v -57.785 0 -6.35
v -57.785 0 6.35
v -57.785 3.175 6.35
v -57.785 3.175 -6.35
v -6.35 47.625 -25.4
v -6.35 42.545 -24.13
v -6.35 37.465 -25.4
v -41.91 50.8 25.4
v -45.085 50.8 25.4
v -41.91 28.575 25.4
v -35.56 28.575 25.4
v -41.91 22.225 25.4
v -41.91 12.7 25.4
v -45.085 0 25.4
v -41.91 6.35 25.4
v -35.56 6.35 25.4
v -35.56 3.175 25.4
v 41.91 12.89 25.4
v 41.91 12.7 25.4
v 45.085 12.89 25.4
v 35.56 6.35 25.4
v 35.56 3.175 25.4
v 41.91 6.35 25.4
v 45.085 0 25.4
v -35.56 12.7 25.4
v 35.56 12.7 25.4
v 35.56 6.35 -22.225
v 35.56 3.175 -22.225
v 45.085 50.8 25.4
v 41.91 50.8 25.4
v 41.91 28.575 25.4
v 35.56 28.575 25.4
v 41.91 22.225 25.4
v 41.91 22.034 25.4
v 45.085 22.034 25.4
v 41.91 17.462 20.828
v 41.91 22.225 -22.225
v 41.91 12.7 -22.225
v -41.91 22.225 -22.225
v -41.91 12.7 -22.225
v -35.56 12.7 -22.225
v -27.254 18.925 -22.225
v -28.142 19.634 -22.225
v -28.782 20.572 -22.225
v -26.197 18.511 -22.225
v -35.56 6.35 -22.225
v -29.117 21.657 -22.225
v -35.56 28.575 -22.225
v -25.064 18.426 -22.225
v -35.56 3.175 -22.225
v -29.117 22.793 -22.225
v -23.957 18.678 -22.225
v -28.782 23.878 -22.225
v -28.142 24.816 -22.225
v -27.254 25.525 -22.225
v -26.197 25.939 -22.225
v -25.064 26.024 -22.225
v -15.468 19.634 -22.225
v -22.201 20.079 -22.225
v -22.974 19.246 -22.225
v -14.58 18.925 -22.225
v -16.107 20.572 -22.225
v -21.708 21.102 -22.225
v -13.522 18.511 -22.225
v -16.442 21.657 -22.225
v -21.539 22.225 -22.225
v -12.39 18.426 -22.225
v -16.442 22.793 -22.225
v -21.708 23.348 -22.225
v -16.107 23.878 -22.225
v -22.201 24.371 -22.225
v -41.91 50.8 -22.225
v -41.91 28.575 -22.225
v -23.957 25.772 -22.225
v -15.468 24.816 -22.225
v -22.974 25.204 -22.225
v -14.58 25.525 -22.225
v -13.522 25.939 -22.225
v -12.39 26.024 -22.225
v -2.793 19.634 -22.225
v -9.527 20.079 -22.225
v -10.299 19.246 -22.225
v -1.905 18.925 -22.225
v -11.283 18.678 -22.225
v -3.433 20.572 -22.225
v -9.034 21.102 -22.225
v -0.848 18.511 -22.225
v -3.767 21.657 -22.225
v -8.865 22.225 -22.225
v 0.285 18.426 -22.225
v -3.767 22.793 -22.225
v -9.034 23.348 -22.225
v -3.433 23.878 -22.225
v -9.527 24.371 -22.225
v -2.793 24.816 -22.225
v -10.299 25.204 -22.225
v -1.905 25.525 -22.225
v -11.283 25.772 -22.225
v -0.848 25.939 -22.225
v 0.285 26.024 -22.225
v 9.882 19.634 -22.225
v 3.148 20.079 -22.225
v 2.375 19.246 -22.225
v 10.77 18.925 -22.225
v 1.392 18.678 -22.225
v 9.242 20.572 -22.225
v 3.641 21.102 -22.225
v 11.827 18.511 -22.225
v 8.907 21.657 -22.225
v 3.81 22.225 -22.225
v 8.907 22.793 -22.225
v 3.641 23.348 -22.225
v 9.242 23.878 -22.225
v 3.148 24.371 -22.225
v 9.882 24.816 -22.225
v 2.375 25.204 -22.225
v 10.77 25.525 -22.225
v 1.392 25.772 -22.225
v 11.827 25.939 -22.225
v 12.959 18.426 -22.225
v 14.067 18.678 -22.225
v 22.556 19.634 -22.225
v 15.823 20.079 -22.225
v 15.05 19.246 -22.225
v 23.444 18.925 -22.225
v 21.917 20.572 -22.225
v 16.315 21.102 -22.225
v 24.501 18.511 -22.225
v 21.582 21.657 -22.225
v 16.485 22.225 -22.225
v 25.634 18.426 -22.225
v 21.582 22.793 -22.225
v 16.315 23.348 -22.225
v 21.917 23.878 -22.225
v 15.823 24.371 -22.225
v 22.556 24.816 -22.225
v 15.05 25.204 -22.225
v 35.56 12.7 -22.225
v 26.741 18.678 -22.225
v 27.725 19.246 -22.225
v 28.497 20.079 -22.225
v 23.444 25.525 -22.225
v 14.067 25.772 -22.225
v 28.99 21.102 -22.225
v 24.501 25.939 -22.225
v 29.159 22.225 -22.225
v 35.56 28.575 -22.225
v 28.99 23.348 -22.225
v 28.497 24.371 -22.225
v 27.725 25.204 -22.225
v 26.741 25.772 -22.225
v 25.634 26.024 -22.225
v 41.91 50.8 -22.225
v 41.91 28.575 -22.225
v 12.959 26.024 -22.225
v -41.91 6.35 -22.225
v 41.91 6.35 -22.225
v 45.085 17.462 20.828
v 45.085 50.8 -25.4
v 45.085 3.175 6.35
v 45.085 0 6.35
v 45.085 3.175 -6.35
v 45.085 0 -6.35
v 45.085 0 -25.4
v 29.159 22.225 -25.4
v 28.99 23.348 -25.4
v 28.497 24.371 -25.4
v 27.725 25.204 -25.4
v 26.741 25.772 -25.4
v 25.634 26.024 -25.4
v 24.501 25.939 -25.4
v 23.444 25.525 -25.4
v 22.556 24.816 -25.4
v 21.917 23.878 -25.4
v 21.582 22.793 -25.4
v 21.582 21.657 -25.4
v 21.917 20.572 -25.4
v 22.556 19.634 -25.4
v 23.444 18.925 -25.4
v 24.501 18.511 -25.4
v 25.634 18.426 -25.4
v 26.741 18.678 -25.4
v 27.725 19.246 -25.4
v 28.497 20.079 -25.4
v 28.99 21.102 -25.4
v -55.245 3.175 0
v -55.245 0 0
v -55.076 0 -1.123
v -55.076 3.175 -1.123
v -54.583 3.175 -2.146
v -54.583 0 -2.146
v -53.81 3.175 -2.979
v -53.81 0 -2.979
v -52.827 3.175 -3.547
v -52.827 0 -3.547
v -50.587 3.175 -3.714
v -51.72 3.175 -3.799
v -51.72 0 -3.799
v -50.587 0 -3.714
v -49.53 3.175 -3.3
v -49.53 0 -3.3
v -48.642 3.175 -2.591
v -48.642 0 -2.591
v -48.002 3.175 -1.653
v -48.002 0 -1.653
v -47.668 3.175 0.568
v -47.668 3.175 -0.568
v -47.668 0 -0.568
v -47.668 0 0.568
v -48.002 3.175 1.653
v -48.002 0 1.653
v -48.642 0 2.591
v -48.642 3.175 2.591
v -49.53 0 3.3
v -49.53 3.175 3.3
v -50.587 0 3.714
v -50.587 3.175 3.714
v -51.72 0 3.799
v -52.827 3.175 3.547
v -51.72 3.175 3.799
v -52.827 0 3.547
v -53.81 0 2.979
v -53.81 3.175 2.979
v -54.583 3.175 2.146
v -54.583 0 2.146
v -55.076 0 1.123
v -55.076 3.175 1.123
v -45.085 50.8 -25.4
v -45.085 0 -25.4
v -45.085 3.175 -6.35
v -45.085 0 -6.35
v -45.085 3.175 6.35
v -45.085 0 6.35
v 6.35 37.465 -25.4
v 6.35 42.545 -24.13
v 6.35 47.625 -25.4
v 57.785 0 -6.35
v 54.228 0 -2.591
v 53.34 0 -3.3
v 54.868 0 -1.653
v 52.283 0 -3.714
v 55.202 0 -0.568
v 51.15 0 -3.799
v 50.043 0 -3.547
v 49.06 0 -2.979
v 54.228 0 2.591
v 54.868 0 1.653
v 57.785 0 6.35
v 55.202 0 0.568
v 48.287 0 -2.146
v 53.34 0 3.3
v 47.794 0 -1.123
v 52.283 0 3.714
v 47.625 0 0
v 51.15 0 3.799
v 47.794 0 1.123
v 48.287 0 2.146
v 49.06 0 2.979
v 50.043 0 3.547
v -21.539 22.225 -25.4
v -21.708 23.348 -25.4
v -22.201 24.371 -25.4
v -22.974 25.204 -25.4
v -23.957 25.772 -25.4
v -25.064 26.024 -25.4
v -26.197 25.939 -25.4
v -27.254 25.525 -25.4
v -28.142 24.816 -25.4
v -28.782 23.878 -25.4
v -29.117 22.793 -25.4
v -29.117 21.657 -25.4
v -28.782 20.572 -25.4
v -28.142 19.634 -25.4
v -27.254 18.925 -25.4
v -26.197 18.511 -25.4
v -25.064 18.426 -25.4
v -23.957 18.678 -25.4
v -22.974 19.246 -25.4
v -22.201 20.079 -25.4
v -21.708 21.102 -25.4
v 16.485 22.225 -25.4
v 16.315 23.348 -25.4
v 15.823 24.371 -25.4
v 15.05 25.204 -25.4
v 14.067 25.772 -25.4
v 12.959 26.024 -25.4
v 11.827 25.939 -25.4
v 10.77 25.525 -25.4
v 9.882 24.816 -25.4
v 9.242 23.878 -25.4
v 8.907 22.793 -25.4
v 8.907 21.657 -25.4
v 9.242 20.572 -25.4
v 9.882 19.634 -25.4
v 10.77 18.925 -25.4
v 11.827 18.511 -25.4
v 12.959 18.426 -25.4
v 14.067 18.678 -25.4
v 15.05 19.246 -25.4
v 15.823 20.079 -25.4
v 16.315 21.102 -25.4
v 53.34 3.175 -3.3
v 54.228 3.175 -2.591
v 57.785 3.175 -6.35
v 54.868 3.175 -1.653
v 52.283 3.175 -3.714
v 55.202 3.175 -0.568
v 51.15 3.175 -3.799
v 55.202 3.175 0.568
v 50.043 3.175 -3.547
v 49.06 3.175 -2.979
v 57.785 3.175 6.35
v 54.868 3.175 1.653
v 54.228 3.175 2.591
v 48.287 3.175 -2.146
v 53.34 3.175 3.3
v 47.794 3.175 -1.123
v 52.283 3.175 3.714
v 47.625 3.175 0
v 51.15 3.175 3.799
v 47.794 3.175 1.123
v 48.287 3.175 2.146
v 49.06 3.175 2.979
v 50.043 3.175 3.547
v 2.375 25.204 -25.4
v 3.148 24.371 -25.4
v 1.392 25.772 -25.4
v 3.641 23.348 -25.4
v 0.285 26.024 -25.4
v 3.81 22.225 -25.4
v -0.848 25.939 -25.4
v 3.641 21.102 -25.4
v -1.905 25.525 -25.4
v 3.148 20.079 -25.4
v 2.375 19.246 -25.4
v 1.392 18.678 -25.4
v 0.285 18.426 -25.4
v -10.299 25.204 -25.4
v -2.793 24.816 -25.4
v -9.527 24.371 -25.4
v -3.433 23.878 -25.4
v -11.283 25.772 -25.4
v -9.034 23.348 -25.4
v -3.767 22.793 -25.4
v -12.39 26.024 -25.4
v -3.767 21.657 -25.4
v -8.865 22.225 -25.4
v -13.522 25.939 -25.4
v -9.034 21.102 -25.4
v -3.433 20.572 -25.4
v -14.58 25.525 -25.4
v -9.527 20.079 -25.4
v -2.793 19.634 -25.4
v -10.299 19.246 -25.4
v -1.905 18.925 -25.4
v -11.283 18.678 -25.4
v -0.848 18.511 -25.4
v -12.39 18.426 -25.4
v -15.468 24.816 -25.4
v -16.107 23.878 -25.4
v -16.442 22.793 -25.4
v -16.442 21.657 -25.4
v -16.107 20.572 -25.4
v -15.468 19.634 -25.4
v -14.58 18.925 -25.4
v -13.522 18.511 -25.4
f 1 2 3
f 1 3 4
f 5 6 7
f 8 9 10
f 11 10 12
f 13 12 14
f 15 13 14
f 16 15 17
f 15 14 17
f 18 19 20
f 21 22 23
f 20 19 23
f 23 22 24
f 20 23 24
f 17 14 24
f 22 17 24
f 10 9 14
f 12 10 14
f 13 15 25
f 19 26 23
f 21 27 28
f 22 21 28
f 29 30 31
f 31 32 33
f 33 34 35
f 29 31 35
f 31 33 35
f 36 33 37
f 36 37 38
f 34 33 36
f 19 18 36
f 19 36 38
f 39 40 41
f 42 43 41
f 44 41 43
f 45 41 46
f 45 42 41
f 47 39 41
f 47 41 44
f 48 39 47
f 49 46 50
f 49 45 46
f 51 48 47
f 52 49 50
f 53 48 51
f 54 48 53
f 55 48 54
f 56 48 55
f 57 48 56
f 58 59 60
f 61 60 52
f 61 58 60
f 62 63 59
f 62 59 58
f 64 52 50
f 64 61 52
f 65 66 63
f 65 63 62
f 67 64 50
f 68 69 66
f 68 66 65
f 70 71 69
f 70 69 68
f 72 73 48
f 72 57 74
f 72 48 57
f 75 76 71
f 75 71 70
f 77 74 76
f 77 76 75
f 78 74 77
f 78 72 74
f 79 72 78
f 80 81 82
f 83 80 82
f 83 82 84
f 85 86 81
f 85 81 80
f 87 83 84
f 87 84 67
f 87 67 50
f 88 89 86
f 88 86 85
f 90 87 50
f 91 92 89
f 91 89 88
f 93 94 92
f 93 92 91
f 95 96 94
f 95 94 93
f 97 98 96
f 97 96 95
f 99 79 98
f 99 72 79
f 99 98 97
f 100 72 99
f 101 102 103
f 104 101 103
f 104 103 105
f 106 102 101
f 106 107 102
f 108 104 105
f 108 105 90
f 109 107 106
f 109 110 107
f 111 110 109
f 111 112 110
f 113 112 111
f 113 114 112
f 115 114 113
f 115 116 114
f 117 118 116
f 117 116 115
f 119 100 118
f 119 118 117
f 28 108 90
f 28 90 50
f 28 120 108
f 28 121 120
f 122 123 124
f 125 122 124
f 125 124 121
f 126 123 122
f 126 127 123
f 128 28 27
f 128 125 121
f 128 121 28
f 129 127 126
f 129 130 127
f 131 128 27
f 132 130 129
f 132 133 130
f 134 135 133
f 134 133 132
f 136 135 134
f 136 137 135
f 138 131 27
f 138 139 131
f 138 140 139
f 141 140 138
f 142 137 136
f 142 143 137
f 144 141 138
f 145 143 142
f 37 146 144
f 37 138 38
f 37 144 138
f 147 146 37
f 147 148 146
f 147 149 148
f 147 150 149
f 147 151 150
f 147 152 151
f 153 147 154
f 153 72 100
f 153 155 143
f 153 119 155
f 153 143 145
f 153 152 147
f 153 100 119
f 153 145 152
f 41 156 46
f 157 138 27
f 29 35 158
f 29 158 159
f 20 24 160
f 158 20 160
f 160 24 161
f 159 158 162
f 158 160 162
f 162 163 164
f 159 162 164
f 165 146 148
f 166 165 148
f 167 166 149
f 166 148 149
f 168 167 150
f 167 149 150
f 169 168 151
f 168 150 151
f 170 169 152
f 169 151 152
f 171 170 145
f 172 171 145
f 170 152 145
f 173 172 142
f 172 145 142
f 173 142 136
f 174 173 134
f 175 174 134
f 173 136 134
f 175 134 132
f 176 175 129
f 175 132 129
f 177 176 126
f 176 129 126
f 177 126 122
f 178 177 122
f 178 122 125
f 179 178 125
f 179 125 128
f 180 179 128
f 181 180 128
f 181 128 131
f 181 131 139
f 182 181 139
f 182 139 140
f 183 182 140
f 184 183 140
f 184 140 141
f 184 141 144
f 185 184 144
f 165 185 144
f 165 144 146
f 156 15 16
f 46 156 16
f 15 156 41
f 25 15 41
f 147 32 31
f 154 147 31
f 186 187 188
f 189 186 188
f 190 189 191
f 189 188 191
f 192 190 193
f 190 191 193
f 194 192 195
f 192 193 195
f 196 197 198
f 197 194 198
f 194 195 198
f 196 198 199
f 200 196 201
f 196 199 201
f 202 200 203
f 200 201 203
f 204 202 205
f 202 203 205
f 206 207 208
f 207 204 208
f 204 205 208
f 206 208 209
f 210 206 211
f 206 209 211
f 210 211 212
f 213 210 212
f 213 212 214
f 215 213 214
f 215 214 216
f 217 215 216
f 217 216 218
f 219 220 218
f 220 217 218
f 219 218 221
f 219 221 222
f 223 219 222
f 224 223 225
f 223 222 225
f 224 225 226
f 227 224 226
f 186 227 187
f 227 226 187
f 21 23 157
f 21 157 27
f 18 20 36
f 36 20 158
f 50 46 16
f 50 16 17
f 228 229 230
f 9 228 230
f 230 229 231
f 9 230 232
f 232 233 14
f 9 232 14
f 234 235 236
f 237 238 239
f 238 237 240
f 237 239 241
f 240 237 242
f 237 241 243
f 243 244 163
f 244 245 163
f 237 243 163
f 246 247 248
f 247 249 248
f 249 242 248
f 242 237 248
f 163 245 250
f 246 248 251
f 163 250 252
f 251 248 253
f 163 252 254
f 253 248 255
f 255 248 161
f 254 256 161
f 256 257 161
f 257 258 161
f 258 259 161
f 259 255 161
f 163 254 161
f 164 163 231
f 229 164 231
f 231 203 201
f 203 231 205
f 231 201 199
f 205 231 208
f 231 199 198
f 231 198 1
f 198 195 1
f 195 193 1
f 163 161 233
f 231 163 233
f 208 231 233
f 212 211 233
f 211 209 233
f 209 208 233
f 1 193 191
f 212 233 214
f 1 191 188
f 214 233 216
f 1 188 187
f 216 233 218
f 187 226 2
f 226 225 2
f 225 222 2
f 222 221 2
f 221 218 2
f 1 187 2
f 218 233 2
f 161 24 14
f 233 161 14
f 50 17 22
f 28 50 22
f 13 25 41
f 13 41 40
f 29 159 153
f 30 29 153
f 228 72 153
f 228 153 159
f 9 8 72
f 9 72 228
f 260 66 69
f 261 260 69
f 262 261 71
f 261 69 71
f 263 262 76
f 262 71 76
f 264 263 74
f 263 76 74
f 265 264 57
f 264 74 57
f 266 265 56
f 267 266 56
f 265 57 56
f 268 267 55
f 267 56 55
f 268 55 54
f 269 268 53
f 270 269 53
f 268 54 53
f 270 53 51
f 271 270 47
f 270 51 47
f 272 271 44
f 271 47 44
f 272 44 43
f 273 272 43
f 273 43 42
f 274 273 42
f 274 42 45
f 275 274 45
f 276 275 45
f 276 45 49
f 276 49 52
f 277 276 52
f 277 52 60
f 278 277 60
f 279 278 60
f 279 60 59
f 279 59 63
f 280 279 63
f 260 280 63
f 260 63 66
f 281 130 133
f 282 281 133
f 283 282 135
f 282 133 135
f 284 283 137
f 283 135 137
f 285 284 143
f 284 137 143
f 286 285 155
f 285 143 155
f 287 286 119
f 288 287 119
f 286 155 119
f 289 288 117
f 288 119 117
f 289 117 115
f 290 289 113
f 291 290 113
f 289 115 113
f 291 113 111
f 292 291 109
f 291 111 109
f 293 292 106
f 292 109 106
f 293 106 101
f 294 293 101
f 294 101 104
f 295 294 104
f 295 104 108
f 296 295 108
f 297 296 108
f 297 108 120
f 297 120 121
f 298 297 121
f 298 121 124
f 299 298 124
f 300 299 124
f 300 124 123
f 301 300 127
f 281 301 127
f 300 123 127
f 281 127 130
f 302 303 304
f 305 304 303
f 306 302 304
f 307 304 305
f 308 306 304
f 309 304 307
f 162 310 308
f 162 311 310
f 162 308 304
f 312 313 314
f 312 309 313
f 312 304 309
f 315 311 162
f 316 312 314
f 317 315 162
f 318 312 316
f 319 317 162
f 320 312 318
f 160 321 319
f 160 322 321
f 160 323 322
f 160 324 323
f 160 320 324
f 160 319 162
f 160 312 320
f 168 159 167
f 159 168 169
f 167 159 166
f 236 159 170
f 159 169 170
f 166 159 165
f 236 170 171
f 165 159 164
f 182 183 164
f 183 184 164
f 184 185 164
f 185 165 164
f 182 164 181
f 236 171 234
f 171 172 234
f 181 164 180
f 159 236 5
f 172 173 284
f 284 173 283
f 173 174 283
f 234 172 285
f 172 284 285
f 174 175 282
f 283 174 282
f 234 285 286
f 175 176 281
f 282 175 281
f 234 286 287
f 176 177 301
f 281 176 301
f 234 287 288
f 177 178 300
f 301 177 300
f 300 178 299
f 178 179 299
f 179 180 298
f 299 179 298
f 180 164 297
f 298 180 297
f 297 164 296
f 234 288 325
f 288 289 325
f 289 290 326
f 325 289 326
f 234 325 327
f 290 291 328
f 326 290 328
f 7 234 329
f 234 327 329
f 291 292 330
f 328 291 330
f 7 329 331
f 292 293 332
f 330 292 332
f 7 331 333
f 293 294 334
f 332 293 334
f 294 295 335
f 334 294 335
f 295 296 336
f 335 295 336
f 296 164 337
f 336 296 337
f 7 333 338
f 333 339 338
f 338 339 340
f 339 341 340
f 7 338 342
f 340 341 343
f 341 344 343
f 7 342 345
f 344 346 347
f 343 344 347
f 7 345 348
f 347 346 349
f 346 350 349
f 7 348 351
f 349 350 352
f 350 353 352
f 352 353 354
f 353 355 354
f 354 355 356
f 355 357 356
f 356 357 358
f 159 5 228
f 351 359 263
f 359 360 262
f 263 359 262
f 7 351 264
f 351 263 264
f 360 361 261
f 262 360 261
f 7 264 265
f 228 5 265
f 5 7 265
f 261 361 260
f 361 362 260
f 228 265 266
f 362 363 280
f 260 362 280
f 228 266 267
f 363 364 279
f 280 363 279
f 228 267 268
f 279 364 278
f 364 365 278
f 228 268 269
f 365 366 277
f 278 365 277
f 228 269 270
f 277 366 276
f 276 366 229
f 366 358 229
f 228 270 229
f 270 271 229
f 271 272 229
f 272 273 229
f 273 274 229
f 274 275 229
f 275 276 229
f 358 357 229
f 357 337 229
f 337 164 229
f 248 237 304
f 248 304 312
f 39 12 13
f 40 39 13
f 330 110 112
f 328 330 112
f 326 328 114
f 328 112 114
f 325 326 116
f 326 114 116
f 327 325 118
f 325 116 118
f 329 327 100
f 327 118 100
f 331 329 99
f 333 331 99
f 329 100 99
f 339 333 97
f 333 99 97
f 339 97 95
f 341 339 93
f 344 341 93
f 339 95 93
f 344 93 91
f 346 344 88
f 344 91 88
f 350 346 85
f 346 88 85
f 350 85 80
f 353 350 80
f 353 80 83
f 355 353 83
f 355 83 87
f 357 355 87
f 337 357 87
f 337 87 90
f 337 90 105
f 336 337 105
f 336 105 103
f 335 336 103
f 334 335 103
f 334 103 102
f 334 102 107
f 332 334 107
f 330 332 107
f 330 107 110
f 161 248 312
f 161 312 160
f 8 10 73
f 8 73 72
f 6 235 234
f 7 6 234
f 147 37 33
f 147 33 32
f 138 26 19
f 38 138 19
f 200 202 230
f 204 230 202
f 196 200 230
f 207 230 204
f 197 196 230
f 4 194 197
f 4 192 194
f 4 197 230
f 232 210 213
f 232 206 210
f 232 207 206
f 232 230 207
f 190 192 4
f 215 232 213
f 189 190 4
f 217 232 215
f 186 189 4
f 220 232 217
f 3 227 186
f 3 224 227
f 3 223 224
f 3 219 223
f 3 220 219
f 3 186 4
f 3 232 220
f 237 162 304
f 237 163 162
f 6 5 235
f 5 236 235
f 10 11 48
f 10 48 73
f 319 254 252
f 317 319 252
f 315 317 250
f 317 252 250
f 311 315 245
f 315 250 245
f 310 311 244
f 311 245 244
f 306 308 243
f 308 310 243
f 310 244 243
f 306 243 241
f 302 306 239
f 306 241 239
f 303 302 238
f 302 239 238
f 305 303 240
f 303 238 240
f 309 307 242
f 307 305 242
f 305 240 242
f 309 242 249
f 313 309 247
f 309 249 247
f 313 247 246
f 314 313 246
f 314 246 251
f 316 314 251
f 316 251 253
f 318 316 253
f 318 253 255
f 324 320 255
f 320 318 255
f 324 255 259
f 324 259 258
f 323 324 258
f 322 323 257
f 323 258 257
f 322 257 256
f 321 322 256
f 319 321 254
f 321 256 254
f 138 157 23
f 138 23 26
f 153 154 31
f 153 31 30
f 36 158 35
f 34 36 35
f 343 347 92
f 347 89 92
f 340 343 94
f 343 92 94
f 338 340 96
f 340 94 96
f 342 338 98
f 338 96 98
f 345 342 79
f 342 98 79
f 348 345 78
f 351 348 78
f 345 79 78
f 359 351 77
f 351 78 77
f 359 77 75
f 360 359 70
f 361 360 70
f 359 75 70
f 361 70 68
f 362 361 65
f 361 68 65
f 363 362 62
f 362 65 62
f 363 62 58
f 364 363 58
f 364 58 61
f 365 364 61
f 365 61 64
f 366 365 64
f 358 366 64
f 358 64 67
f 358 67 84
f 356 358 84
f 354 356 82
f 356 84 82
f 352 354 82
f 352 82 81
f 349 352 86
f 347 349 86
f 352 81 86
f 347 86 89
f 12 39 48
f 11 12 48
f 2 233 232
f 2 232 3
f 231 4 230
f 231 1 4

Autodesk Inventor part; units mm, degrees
ref_plane "YZ Plane" through (0, 0, 0) normal (1, 0, 0) x (0, 1, 0)
ref_plane "XZ Plane" through (0, 0, 0) normal (0, 1, 0) x (-1, 0, 0)
ref_plane "XY Plane" through (0, 0, 0) normal (0, 0, 1) x (1, 0, 0)
sketch "Sketch1" plane through (0, 0, 0) normal (0, 1, 0) x (-1, 0, 0)
  line L0 (45.085, 25.4) -> (-45.085, 25.4)
  line L1 (-45.085, 25.4) -> (-45.085, -25.4)
  line L2 (-45.085, -25.4) -> (45.085, -25.4)
  line L3 (45.085, -25.4) -> (45.085, 25.4)
  point P0 (0, 0)
  dimension "d0" = 90.17
  dimension "d1" = 45.085
  dimension "d2" = 50.8
  dimension "d3" = 25.4
extrude "Extrusion1" add sketch "Sketch1" along normal blind 50.8
sketch "Sketch2" plane through (0, 0, 0) normal (0, 1, 0) x (-1, 0, 0)
  line L0 (45.085, -25.4) -> (45.085, 25.4) projected
  line L1 (45.085, 6.35) -> (57.785, 6.35)
  line L2 (57.785, 6.35) -> (57.785, -6.35)
  line L3 (57.785, -6.35) -> (45.085, -6.35)
  line L4 (45.085, -6.35) -> (45.085, 6.35)
  line L5 (-45.085, 25.4) -> (-45.085, -25.4) projected
  line L6 (-45.085, -6.35) -> (-57.785, -6.35)
  line L7 (-57.785, -6.35) -> (-57.785, 6.35)
  line L8 (-57.785, 6.35) -> (-45.085, 6.35)
  line L9 (-45.085, 6.35) -> (-45.085, -6.35)
  circle A0 centre (51.435, 0) radius 3.81
  circle A1 centre (-51.435, 0) radius 3.81
  line L10 (51.435, 0) -> (51.435, -6.35) construction
  point P0 (0, 0)
  point P1 (-45.085, 6.35)
  point P2 (45.085, -6.35)
  dimension "d6" = 12.7
  dimension "d7" = 12.7
  dimension "d8" = 6.35
  dimension "d9" = 7.62
  dimension "d34" = 6.35
  dimension "d35" = 6.35
  dimension "d37" = 6.35
extrude "Extrusion2" add sketch "Sketch2" along normal blind 3.175
sketch "Sketch4" plane through (-45.085, 0, 25.4) normal (0, 0, 1) x (1, 0, 0)
  line L0 (9.525, 3.175) -> (80.645, 3.175)
  line L1 (90.17, 0) -> (90.17, 50.8) projected
  line L2 (0, 50.8) -> (90.17, 50.8) projected
  line L3 (0, 0) -> (90.17, 0) projected
  line L4 (3.175, 40.8121) -> (3.175, 50.8)
  line L5 (90.17, 50.8) -> (0, 50.8) projected
  circle A0 centre (13.335, 40.8121) radius 2.5681 construction
  circle A1 centre (29.21, 40.8121) radius 2.5681 construction
  circle A2 centre (45.085, 40.8121) radius 2.6318 construction
  circle A3 centre (60.96, 40.8121) radius 2.9599 construction
  circle A4 centre (76.835, 40.8121) radius 2.9663 construction
  line L6 (3.175, 40.8121) -> (13.335, 40.8121) construction
  line L7 (13.335, 40.8121) -> (29.21, 40.8121) construction
  line L8 (29.21, 40.8121) -> (45.085, 40.8121) construction
  line L9 (45.085, 40.8121) -> (60.96, 40.8121) construction
  line L10 (60.96, 40.8121) -> (76.835, 40.8121) construction
  line L11 (76.835, 40.8121) -> (86.995, 40.8121) construction
  line L12 (3.175, 6.35) -> (9.525, 12.7)
  line L13 (9.525, 12.7) -> (3.175, 12.7)
  line L14 (3.175, 22.225) -> (9.525, 28.575)
  line L15 (9.525, 28.575) -> (3.175, 28.575)
  line L16 (45.085, 3.175) -> (45.085, 50.8) construction
  line L17 (3.175, 22.225) -> (3.175, 12.7)
  line L18 (0, 0) -> (0, 50.8) projected
  line L19 (90.17, 0) -> (0, 0) projected
  line L20 (3.175, 6.35) -> (9.525, 6.35)
  line L21 (9.525, 6.35) -> (9.525, 3.175)
  line L22 (86.995, 6.35) -> (80.645, 6.35)
  line L23 (80.645, 6.35) -> (80.645, 3.175)
  line L24 (3.175, 28.575) -> (3.175, 40.8121)
  line L25 (86.995, 12.7) -> (86.995, 6.35)
  line L26 (86.995, 6.35) -> (80.645, 12.7)
  line L27 (80.645, 12.7) -> (86.995, 12.7)
  line L28 (86.995, 22.225) -> (80.645, 28.575)
  line L29 (80.645, 28.575) -> (86.995, 28.575)
  line L30 (86.995, 22.225) -> (86.995, 12.7)
  line L31 (86.995, 28.575) -> (86.995, 40.8121)
  line L32 (86.995, 40.8121) -> (86.995, 50.8)
  line L33 (90.17, 0) -> (90.17, 50.8) projected
  point P0 (45.085, 0)
  point P1 (3.175, 6.35)
  dimension "d15" = 3.175
  dimension "d19" = 15.875
  dimension "d22" = 6.35
  dimension "d23" = 9.525
  dimension "d25" = 6.35
  dimension "d26" = 25.4
  dimension "d39" = 6.35
  dimension "d40" = 6.35
  dimension "d41" = 3.175
  dimension "d42" = 3.175
extrude "Extrusion3" cut sketch "Sketch4" against normal blind 47.625 contours L21 L20 L12 L13 L17 L14 L15 L24 L4 L2 L32 L31 L29 L28 L30 L27 L26 L22 L23 L0
sketch "Sketch5" plane through (-45.085, 0, -22.225) normal (0, 0, 1) x (1, 0, 0)
  line L0 (3.175, 12.065) -> (3.175, 22.225) projected
  line L1 (19.7358, 22.225) -> (32.4104, 22.225) construction
  line L2 (32.4104, 22.225) -> (45.085, 22.225) construction
  line L3 (45.085, 22.225) -> (57.7596, 22.225) construction
  line L4 (57.7596, 22.225) -> (70.4342, 22.225) construction
  line L5 (86.995, 22.225) -> (86.995, 12.065) projected
  circle A0 centre (19.7358, 22.225) radius 3.81
  circle A1 centre (32.4104, 22.225) radius 3.81
  circle A2 centre (45.085, 22.225) radius 3.81
  circle A3 centre (57.7596, 22.225) radius 3.81
  circle A4 centre (70.4342, 22.225) radius 3.81
  line L6 (19.7358, 22.225) -> (3.175, 22.225) construction
  line L7 (70.4342, 22.225) -> (86.995, 22.225) construction
  line L8 (80.645, 3.175) -> (9.525, 3.175) projected
  line L9 (0, 0) -> (90.17, 0) projected
  point P0 (45.085, 0)
  point P1 (86.995, 3.175)
  point P2 (3.175, 3.175)
  dimension "d29" = 12.6746
  dimension "d30" = 7.62
  dimension "d38" = 22.225
extrude "Extrusion4" cut sketch "Sketch5" against normal blind 47.625
sketch "Sketch7" plane through (0, 0, 0) normal (1, 0, 0) x (0, 1, 0)
  line L0 (0, -25.4) -> (50.8, -25.4) projected
  line L1 (50.8, -25.4) -> (47.625, -25.4)
  line L2 (47.625, -25.4) -> (42.545, -24.13)
  line L3 (42.545, -24.13) -> (37.465, -25.4)
  line L4 (37.465, -25.4) -> (47.625, -25.4)
  line L5 (50.8, 25.4) -> (50.8, -25.4) projected
  point P0 (0, 0)
  point P1 (37.465, -25.4)
  dimension "d43" = 3.175
  dimension "d44" = 1.27
  dimension "d45" = 10.16
extrude "Extrusion5" cut sketch "Sketch7" against normal mid plane 12.7
sketch "Sketch8" plane through (45.085, 0, -25.4) normal (1, 0, 0) x (0, 0, -1)
  line L0 (-50.8, 12.7) -> (-50.8, 12.8905) construction
  line L1 (-50.8, 0) -> (-50.8, 50.8) construction
  line L2 (-50.8, 12.8905) -> (-46.228, 17.4625)
  line L3 (-46.228, 17.4625) -> (-50.8, 22.0345)
  line L4 (-50.8, 22.0345) -> (-50.8, 22.225) construction
  line L5 (-50.8, 22.225) -> (-3.175, 22.225) construction
  line L6 (-50.8, 22.225) -> (-46.228, 22.225) construction
  line L7 (-46.228, 22.225) -> (-46.228, 17.4625) construction
  line L8 (-46.228, 17.4625) -> (-46.228, 12.7) construction
  line L9 (-50.8, 12.7) -> (-3.175, 12.7) construction
  line L10 (-46.228, 12.7) -> (-50.8, 12.7) construction
  line L11 (-50.8, 22.0345) -> (-50.8, 12.8905)
  point P0 (-25.4, 0)
  dimension "d48" = 45
  dimension "d49" = 45
  dimension "d50" = 4.572
extrude "Extrusion6" cut sketch "Sketch8" against normal blind 25.4
equation "\"d1\" = 0.5 * d0"
equation "\"d3\" = 0.5 * d2"
equation "\"d8\" = 0.5 * d7"
equation "\"d34\" = 0.5 * d6"
equation "\"d35\" = d34"
equation "\"d37\" = d8"
equation "\"d15\" = d12"
equation "\"d42\" = d41"
equation "\"d12\" = 3.175"
properties part number "PCB_Case02"
